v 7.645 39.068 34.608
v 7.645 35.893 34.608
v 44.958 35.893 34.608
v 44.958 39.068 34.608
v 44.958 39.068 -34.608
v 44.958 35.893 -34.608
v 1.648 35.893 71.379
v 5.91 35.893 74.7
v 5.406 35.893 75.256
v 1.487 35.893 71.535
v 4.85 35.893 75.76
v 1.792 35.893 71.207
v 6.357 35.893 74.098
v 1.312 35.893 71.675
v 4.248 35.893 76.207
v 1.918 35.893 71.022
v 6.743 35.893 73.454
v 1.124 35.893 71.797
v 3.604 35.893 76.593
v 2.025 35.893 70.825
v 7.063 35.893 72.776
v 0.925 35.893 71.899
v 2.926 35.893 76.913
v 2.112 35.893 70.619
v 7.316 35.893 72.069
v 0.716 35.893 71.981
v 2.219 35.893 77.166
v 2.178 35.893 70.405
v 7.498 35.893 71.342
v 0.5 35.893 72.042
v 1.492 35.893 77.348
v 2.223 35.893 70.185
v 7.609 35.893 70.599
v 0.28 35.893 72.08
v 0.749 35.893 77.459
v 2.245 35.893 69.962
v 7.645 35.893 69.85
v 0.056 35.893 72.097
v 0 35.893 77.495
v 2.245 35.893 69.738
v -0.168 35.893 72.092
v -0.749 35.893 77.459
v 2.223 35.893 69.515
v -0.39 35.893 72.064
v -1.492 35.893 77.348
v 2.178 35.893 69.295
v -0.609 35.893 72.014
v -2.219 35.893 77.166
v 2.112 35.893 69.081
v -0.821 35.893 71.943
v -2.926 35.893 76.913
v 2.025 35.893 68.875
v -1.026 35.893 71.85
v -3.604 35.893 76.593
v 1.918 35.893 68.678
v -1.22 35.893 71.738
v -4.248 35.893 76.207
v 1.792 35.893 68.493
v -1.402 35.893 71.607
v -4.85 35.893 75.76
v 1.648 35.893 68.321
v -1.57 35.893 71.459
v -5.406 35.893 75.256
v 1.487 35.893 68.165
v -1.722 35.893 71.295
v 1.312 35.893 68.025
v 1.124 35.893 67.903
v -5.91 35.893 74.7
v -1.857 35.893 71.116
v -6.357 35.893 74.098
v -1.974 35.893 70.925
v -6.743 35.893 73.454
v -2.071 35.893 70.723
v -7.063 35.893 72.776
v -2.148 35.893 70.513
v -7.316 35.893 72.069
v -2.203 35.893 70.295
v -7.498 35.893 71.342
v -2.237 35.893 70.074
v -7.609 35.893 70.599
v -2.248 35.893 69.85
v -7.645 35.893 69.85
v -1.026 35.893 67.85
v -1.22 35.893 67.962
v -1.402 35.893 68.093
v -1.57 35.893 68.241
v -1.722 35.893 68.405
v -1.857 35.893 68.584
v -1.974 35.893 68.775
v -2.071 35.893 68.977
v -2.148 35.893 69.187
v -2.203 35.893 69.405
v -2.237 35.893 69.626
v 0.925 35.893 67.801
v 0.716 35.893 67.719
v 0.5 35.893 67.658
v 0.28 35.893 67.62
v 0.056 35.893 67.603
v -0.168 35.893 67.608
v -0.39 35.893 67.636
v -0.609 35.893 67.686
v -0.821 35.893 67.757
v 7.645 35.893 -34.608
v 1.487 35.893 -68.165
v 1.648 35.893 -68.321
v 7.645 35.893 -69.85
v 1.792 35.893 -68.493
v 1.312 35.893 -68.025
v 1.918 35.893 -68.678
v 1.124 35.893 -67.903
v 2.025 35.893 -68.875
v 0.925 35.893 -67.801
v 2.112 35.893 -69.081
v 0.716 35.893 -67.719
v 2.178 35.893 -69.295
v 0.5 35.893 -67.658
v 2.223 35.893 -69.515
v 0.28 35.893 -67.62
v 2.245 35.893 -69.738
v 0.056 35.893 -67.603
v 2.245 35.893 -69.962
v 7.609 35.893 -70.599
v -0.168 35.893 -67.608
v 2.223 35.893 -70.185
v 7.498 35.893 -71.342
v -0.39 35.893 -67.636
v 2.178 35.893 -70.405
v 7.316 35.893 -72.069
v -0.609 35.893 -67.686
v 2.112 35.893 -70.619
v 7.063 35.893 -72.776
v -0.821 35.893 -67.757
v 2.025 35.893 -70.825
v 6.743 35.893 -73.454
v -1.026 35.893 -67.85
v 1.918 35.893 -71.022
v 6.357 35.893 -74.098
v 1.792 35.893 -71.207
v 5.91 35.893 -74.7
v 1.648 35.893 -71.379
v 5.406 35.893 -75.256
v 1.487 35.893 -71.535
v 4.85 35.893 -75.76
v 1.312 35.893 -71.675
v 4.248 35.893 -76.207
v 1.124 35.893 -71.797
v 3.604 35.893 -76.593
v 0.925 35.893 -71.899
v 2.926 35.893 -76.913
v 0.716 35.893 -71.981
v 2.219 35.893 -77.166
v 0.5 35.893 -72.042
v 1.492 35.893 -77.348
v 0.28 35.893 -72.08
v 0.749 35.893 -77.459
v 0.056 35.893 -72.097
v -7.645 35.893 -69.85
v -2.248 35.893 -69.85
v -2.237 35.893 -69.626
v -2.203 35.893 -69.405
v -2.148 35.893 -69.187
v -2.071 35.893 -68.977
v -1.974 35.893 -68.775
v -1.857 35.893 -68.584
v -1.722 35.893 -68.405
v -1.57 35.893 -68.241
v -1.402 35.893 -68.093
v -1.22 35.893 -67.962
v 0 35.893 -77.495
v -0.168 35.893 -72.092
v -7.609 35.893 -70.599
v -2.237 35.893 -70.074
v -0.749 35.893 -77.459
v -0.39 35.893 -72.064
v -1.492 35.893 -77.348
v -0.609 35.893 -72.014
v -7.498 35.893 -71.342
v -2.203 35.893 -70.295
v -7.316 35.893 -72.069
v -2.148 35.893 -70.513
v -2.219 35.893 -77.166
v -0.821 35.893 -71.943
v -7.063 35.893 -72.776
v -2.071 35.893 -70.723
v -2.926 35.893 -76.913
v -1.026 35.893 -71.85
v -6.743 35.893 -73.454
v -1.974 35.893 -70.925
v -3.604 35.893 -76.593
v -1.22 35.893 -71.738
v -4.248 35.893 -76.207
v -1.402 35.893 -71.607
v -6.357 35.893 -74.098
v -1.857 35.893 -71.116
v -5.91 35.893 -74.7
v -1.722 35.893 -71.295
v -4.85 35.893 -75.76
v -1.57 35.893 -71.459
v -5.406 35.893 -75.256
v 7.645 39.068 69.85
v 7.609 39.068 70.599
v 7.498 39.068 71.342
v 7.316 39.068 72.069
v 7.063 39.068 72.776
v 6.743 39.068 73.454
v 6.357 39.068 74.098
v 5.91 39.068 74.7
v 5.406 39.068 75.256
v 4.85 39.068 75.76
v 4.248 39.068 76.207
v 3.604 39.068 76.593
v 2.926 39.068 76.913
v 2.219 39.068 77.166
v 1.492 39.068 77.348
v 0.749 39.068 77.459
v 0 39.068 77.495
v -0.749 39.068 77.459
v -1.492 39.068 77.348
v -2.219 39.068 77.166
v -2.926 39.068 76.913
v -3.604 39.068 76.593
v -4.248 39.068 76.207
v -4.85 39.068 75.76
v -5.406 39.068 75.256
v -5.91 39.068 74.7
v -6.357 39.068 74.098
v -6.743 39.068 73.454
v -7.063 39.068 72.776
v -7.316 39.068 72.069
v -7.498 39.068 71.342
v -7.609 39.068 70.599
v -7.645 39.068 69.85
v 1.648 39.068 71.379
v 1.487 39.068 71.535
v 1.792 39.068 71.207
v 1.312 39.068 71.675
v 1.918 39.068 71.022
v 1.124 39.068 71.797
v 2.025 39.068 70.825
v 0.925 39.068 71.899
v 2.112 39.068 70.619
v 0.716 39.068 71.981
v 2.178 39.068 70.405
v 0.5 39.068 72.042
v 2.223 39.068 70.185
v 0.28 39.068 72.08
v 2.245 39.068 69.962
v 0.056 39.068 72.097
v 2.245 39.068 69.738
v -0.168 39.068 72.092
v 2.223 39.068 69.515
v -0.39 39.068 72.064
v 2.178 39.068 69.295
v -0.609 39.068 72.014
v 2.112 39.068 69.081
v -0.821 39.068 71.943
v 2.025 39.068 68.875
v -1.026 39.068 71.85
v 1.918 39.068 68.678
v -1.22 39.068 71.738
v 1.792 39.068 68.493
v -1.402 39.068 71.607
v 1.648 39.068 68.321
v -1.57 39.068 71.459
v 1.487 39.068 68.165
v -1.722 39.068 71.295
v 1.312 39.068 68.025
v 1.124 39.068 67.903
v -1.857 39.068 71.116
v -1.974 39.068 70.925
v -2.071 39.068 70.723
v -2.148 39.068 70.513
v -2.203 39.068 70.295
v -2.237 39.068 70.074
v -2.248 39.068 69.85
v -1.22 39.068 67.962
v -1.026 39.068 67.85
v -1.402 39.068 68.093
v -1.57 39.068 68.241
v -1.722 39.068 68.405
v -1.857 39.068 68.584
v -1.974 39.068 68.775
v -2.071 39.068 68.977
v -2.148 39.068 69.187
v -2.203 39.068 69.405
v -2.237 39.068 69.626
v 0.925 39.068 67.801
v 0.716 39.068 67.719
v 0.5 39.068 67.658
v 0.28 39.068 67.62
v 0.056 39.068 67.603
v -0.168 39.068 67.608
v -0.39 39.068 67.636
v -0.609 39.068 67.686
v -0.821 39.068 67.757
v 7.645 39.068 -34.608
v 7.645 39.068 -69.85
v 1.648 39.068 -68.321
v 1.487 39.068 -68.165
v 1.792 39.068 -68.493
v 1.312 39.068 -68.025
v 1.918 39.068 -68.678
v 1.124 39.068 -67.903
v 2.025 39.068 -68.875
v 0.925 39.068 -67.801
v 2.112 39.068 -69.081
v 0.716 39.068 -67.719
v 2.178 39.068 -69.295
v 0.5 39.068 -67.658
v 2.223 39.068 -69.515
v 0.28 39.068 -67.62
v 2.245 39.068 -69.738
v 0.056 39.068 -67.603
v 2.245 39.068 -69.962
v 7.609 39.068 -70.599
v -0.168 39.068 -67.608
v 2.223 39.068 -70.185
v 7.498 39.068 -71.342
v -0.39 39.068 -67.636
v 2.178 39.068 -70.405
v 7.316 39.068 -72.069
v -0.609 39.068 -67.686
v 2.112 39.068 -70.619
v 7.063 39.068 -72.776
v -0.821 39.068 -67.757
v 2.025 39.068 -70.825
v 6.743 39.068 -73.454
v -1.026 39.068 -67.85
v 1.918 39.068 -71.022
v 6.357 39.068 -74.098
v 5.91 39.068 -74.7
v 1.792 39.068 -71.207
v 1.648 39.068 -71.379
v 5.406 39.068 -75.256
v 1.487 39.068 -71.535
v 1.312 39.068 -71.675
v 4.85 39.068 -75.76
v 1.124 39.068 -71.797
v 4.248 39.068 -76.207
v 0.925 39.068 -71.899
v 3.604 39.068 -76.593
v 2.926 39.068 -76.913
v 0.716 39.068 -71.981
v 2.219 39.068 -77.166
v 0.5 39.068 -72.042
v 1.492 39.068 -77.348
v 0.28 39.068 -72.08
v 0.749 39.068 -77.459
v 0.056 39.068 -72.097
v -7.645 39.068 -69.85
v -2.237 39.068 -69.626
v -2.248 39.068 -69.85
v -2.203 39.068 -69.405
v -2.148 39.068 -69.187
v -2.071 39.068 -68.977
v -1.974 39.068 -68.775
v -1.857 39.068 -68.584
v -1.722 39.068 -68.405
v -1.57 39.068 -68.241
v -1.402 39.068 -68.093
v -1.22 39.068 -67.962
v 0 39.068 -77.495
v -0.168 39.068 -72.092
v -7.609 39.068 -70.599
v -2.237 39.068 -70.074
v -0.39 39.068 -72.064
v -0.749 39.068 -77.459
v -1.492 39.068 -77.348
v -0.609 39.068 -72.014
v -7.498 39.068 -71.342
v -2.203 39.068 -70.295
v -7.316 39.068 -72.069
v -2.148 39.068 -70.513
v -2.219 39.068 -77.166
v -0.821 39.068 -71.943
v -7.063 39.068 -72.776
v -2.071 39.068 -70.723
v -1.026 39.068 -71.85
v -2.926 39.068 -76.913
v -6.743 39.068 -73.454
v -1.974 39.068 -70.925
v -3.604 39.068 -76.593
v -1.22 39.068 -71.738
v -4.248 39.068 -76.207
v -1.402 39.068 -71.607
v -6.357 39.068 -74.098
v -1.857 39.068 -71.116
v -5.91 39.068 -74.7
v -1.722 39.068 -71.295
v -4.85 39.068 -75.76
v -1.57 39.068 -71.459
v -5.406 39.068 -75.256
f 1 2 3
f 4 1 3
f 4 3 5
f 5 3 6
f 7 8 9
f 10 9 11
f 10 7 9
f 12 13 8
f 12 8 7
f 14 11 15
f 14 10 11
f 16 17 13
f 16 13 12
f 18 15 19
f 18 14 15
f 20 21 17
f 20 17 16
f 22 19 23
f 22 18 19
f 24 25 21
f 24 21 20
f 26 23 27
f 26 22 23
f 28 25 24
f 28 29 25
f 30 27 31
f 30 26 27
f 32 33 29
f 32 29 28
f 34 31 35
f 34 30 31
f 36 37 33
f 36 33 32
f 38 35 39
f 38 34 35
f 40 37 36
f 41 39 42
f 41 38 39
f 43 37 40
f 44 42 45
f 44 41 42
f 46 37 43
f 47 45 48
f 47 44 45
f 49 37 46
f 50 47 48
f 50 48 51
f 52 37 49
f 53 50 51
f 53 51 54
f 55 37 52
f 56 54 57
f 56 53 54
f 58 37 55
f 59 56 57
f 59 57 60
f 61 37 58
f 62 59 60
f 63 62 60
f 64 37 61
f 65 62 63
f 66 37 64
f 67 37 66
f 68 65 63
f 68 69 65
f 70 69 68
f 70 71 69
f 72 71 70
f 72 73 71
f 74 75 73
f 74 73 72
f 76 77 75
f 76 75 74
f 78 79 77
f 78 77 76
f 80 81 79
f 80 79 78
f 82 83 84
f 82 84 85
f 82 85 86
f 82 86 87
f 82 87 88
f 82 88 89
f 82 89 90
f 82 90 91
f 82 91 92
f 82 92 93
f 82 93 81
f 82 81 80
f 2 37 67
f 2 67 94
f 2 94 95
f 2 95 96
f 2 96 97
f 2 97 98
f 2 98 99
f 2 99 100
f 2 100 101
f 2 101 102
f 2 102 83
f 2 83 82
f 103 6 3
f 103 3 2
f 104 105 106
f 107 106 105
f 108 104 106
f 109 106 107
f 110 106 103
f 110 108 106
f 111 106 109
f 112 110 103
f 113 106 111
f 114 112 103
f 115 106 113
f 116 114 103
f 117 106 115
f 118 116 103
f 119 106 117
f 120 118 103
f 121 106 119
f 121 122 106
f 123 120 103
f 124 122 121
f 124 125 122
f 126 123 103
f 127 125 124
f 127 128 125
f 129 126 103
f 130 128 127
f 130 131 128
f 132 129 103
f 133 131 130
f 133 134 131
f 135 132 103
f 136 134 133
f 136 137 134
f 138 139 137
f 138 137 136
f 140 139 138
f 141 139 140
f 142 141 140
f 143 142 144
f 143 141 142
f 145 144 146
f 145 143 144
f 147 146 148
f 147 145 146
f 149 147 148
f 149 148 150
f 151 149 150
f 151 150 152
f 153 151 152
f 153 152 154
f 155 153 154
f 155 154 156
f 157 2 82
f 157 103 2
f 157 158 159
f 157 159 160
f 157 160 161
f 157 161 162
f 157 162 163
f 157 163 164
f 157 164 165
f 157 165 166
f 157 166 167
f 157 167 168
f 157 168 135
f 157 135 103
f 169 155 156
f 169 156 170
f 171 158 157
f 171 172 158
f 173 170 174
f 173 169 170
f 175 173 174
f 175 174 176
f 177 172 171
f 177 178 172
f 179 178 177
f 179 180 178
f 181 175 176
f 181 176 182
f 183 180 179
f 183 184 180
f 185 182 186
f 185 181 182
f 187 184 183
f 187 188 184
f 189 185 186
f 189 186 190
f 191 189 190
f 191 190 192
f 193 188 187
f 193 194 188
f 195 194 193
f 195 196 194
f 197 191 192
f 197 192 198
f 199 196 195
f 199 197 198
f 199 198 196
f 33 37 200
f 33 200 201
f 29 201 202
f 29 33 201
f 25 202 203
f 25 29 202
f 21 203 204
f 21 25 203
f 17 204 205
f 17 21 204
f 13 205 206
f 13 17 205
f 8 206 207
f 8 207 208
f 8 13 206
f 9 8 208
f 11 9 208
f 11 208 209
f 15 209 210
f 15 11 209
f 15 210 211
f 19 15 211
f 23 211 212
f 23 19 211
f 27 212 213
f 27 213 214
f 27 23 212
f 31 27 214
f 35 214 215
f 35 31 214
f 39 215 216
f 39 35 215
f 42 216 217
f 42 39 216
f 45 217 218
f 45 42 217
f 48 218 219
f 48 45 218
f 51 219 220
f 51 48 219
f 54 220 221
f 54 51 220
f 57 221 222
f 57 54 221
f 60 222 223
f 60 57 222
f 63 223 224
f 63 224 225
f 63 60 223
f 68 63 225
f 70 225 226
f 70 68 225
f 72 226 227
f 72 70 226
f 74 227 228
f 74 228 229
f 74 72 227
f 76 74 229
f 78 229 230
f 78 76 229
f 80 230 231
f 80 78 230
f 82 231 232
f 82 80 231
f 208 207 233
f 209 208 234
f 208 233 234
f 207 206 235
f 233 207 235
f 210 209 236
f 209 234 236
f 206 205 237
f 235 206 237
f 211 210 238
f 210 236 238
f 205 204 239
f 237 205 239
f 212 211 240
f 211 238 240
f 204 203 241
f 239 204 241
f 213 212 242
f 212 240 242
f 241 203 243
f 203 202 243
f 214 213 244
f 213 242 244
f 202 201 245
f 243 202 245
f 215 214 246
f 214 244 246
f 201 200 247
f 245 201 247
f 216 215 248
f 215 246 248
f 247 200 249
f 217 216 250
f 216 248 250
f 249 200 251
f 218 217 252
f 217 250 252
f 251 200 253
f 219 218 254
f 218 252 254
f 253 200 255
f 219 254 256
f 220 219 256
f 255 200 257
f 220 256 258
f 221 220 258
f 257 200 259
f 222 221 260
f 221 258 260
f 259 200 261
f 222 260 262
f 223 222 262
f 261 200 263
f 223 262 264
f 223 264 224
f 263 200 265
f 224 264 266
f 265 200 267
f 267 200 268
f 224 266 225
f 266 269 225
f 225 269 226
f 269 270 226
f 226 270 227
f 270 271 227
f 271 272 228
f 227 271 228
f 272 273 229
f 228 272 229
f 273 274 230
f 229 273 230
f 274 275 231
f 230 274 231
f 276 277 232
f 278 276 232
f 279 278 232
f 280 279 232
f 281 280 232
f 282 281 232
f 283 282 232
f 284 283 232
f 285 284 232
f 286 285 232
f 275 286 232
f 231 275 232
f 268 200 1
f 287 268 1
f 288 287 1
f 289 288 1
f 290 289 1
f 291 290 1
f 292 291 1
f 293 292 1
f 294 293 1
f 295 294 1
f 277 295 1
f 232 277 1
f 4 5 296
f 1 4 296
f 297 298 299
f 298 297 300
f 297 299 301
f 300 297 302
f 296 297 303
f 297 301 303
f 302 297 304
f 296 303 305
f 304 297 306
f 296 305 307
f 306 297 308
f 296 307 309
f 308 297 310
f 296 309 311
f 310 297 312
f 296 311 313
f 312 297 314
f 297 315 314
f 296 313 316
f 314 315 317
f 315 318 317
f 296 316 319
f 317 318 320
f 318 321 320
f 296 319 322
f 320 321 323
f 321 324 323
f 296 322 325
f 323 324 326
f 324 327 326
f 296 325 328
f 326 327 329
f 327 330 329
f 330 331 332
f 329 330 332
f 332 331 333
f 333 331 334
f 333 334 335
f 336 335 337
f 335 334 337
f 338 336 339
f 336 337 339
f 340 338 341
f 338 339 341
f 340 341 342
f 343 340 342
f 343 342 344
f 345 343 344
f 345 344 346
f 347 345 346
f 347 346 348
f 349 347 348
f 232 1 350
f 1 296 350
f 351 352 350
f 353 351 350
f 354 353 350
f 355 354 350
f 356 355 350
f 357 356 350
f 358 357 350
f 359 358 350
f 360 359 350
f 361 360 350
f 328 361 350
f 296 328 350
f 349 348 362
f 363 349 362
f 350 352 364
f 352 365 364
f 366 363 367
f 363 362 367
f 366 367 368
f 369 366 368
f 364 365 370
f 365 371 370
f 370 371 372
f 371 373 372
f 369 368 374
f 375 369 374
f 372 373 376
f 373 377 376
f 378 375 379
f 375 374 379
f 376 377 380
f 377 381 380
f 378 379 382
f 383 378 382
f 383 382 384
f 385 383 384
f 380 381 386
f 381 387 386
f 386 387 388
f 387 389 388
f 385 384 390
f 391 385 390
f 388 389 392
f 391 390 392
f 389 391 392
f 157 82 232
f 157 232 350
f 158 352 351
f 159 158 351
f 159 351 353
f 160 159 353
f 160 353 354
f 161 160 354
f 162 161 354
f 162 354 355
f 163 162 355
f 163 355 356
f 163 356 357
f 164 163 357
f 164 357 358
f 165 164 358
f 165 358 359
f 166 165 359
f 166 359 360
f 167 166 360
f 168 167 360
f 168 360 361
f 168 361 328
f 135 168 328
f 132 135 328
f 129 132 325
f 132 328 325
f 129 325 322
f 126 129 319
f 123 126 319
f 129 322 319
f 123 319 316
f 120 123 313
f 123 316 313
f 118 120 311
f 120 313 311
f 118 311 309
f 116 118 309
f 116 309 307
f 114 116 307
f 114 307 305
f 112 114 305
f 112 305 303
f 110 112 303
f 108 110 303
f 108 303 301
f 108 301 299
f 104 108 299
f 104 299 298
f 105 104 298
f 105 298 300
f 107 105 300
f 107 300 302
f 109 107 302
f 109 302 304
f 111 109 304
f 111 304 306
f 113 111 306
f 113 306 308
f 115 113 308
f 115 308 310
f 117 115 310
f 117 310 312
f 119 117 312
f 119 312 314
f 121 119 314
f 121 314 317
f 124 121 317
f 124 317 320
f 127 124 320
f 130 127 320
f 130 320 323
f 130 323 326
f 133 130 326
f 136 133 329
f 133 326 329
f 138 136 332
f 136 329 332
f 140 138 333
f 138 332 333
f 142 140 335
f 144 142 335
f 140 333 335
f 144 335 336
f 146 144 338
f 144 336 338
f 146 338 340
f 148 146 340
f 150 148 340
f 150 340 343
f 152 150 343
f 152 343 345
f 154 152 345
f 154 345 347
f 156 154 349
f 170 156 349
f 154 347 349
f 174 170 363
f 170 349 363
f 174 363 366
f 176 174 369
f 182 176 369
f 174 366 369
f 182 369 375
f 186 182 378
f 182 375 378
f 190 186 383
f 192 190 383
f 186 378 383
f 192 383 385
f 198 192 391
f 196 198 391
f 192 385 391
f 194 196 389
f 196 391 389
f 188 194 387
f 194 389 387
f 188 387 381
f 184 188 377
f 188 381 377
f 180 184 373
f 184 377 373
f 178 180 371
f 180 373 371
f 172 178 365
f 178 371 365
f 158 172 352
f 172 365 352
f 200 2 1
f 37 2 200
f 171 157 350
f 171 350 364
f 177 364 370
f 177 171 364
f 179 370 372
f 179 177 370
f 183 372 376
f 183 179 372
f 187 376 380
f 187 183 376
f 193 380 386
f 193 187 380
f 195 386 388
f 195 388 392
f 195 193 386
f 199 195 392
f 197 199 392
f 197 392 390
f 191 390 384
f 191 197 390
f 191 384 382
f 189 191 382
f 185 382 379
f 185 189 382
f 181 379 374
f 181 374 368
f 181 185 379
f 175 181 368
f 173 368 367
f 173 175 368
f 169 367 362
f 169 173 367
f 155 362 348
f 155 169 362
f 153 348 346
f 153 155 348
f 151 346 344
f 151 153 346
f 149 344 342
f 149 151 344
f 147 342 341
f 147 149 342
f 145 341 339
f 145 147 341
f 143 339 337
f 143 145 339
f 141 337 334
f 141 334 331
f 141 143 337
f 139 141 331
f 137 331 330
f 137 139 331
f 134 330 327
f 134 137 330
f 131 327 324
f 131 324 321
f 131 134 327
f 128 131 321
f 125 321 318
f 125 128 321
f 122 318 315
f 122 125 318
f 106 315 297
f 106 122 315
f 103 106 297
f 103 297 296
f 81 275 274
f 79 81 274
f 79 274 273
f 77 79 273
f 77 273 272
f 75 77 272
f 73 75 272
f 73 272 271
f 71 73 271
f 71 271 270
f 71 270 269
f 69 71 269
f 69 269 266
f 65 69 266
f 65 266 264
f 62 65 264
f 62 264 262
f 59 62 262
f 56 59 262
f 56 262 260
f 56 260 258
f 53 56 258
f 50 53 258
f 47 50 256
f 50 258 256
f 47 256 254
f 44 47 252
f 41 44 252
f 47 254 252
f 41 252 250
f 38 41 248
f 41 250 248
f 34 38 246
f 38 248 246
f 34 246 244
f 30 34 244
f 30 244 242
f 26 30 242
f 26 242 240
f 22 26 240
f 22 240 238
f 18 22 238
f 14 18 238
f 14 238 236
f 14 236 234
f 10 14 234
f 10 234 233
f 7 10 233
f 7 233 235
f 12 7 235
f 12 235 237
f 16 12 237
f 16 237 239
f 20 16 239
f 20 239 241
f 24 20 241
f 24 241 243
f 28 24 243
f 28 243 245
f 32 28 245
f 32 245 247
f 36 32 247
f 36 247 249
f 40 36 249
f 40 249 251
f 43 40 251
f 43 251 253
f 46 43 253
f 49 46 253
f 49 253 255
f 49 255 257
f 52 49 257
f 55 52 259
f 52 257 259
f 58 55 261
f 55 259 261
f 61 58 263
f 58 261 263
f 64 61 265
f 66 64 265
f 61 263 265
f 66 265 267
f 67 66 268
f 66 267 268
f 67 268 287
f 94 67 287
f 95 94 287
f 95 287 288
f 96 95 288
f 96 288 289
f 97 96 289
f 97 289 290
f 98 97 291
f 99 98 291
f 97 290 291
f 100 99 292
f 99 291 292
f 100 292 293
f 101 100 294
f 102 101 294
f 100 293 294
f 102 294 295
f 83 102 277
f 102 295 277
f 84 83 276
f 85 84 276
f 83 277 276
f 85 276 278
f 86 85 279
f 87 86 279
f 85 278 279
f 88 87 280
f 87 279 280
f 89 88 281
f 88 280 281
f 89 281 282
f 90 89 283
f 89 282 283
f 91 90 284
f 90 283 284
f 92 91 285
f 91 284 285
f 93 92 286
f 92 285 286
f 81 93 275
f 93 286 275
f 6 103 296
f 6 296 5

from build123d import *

# Parameters (mm, degrees)
SKETCH_W                  = 37.3126
SKETCH_H                  = 69.215
CORE_HOLDER_PLATE_F_DEPTH = 3.175
F_8_CLEARANCE_HOLE2_D     = 4.4958


with BuildPart() as part:
    # Sketch → CORE_HOLDER_PLATE-F (new body)
    with BuildSketch(Plane(origin=(0, 35.89274, 0), x_dir=(1, 0, 0), z_dir=(0, 1, 0))):
        with BuildLine():
            Line((7.6454, 69.85), (7.6454, -69.85))
            ThreePointArc((7.6454, -69.85), (0, -77.4954), (-7.6454, -69.85))
            Line((-7.6454, -69.85), (-7.6454, 69.85))
            ThreePointArc((-7.6454, 69.85), (0, 77.4954), (7.6454, 69.85))
        make_face()
        with Locations((26.3017, 0)):
            Rectangle(SKETCH_W, SKETCH_H)
    extrude(amount=CORE_HOLDER_PLATE_F_DEPTH)

    # #8 Clearance Hole2 (through all)
    with Locations(Plane.XZ.offset(-35.89274)):
        with Locations((0, 69.85), (0, -69.85)):
            Hole(F_8_CLEARANCE_HOLE2_D / 2)


solid = part.part
